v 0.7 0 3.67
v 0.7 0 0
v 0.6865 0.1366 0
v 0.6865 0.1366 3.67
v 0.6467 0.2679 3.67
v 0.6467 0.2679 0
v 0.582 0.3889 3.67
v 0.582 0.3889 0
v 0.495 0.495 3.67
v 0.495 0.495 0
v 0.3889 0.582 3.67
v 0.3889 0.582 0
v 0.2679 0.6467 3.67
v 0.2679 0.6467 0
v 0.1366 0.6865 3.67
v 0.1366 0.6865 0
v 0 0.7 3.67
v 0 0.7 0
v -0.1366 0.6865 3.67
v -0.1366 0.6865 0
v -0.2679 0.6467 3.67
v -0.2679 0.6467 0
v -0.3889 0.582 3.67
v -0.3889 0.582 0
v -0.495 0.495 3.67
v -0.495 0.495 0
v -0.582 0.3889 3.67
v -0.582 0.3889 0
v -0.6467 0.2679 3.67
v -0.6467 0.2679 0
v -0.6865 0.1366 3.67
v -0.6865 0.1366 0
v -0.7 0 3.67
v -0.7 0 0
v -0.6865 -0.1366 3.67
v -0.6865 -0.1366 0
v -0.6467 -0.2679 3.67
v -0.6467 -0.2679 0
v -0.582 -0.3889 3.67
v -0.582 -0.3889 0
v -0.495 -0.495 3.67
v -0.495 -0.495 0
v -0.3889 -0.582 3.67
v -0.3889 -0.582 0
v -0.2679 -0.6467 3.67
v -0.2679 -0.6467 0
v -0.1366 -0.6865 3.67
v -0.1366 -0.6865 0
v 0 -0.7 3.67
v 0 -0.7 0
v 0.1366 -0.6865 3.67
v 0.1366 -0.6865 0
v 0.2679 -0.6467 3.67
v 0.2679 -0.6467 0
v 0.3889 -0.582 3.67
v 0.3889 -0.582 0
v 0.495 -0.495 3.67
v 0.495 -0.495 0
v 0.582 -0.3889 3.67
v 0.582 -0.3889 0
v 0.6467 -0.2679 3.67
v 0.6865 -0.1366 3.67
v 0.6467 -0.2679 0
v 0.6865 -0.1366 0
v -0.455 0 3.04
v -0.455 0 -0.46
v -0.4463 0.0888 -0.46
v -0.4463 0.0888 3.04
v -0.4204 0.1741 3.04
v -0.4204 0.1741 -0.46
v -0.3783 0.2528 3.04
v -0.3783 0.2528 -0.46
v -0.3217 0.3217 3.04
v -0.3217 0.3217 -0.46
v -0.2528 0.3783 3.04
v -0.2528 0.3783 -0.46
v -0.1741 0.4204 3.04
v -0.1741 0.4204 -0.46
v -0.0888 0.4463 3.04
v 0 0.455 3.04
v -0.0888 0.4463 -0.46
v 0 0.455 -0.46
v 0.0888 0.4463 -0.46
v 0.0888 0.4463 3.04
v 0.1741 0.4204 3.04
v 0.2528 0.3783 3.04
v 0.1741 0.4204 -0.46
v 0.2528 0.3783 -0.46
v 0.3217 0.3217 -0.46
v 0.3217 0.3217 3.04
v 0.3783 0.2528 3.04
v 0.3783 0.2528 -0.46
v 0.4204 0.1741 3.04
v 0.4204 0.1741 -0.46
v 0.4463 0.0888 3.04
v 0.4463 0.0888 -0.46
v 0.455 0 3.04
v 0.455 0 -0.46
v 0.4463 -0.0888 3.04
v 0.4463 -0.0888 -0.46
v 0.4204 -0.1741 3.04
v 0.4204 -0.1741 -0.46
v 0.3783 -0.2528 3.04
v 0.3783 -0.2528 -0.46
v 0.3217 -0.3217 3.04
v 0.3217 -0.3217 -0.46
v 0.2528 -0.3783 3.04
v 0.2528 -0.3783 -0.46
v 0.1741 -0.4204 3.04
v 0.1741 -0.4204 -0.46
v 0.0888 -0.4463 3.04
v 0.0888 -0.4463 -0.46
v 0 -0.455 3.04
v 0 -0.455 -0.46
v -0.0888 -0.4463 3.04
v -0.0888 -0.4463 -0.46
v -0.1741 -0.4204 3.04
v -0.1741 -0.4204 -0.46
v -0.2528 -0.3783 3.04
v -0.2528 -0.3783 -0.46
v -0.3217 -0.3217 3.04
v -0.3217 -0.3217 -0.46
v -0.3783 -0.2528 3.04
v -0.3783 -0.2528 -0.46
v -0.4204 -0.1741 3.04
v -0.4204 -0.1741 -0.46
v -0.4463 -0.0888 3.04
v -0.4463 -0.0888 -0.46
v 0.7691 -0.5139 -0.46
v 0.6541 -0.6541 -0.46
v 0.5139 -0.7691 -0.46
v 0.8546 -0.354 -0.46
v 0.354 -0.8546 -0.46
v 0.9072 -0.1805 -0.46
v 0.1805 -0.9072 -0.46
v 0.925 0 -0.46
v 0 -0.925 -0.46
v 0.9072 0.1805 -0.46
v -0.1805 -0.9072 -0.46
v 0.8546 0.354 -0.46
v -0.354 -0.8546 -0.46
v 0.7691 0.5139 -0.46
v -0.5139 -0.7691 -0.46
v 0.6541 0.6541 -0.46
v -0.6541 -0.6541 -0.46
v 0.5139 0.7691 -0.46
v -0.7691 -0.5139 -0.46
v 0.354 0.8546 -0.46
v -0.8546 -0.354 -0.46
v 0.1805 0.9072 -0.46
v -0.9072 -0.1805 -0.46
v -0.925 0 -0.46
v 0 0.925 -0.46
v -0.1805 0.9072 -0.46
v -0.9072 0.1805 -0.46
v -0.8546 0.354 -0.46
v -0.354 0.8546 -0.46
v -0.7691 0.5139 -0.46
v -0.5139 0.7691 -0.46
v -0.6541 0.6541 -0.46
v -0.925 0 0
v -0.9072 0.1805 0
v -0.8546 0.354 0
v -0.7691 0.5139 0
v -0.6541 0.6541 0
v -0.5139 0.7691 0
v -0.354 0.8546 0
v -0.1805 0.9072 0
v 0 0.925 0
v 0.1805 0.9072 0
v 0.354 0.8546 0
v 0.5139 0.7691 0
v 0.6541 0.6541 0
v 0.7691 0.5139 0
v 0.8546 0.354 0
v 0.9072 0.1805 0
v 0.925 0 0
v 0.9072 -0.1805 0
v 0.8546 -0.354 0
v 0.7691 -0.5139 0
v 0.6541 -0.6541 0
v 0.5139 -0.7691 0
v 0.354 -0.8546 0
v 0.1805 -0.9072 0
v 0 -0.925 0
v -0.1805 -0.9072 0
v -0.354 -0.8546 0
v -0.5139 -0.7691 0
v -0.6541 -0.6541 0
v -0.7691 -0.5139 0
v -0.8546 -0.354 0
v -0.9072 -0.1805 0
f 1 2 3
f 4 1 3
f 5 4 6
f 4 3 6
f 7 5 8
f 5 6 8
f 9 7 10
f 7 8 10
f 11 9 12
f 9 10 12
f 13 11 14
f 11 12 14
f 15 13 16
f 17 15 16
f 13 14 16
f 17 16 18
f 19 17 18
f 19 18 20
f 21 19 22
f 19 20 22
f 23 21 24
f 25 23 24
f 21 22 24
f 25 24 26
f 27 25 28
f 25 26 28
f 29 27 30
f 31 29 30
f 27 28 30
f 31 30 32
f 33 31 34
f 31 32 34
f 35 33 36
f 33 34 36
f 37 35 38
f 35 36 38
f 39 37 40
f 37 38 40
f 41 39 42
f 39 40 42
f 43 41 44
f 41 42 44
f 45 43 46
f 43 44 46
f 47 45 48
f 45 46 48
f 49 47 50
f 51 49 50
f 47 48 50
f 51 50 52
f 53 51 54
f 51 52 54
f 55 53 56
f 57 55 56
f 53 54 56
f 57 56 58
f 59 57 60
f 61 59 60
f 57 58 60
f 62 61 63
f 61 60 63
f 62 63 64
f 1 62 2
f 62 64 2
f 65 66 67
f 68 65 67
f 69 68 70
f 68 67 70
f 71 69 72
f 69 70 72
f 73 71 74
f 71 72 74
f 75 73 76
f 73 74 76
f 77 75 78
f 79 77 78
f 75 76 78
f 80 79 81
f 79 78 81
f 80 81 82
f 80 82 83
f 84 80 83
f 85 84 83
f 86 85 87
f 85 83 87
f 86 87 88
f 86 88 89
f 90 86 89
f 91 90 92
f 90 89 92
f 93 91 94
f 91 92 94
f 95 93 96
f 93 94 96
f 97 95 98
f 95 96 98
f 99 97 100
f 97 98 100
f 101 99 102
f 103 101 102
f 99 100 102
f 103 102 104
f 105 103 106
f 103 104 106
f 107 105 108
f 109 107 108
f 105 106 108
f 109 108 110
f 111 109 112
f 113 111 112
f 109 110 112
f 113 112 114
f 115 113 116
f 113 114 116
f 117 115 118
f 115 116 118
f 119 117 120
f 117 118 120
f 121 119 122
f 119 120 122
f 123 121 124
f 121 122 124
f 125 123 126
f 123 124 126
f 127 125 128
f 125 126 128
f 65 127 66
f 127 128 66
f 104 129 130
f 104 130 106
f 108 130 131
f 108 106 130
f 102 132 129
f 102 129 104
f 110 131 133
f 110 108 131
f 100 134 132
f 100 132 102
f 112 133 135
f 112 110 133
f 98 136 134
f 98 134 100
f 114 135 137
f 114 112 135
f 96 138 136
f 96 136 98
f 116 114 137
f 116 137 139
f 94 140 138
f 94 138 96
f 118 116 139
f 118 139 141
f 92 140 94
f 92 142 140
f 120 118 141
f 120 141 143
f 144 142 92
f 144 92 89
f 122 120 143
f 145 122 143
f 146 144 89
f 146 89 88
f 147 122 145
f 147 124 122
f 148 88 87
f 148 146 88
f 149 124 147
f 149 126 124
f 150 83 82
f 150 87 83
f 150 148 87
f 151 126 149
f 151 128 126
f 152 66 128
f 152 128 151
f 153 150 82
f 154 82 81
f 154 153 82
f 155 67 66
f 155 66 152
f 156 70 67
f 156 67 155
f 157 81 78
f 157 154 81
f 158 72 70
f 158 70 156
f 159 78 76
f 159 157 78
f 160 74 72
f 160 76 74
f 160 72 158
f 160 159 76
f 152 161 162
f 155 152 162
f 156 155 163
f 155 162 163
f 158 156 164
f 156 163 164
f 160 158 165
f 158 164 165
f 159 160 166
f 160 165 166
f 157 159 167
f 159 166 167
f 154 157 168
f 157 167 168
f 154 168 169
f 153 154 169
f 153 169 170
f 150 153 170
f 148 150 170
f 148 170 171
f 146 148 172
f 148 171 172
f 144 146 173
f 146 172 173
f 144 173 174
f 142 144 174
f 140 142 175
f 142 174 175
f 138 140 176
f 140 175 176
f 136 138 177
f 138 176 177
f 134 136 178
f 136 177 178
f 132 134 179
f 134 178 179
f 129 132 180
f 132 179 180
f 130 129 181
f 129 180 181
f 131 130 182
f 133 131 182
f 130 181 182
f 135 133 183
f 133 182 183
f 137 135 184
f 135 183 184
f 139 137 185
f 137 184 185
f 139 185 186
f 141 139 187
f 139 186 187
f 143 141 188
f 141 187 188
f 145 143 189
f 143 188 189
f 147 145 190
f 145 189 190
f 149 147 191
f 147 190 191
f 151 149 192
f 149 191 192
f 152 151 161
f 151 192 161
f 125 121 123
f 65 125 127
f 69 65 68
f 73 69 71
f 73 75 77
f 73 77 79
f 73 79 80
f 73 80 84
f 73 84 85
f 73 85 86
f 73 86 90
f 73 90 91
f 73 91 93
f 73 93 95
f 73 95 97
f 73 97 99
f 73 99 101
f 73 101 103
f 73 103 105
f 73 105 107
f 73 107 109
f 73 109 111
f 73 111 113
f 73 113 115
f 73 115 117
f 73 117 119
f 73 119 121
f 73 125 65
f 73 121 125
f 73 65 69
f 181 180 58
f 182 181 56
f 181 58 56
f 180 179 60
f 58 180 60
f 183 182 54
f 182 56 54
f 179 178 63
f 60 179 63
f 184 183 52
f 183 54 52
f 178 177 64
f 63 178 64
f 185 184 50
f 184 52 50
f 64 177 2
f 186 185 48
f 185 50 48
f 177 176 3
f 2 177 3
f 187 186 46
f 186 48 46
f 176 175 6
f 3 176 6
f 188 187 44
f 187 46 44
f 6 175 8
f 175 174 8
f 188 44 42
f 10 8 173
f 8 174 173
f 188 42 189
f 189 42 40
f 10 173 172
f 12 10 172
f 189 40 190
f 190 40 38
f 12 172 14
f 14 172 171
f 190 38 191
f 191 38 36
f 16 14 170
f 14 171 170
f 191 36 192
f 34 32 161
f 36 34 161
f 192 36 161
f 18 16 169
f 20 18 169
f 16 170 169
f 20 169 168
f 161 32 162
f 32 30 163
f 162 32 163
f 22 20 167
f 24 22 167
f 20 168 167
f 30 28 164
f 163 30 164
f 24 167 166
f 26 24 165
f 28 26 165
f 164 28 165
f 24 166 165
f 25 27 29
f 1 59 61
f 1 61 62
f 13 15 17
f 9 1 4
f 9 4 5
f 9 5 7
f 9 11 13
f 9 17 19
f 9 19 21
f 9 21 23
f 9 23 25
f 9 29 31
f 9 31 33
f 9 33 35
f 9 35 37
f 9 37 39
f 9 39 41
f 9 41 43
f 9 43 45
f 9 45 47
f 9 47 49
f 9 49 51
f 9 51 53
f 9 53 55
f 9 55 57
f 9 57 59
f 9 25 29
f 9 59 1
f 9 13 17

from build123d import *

# Parameters (mm, degrees)
SKETCH1_R           = 0.7
BOSS_EXTRUDE1_DEPTH = 3.67
SKETCH2_R           = 0.925
BOSS_EXTRUDE2_DEPTH = 0.46
SKETCH3_R           = 0.455
CUT_EXTRUDE1_DEPTH  = 3.5


with BuildPart() as part:
    # Sketch1 → Boss-Extrude1 (new body)
    with BuildSketch(Plane.XY):
        Circle(SKETCH1_R)
    extrude(amount=BOSS_EXTRUDE1_DEPTH)

    # Sketch2 → Boss-Extrude2 (add)
    with BuildSketch(Plane(origin=(0, 0, 0), x_dir=(-1, 0, 0), z_dir=(0, 0, -1))):
        Circle(SKETCH2_R)
    extrude(amount=BOSS_EXTRUDE2_DEPTH)

    # Sketch3 → Cut-Extrude1 (cut)
    with BuildSketch(Plane(origin=(0, 0, -0.46), x_dir=(-1, 0, 0), z_dir=(0, 0, -1))):
        Circle(SKETCH3_R)
    extrude(amount=-CUT_EXTRUDE1_DEPTH, mode=Mode.SUBTRACT)


solid = part.part
